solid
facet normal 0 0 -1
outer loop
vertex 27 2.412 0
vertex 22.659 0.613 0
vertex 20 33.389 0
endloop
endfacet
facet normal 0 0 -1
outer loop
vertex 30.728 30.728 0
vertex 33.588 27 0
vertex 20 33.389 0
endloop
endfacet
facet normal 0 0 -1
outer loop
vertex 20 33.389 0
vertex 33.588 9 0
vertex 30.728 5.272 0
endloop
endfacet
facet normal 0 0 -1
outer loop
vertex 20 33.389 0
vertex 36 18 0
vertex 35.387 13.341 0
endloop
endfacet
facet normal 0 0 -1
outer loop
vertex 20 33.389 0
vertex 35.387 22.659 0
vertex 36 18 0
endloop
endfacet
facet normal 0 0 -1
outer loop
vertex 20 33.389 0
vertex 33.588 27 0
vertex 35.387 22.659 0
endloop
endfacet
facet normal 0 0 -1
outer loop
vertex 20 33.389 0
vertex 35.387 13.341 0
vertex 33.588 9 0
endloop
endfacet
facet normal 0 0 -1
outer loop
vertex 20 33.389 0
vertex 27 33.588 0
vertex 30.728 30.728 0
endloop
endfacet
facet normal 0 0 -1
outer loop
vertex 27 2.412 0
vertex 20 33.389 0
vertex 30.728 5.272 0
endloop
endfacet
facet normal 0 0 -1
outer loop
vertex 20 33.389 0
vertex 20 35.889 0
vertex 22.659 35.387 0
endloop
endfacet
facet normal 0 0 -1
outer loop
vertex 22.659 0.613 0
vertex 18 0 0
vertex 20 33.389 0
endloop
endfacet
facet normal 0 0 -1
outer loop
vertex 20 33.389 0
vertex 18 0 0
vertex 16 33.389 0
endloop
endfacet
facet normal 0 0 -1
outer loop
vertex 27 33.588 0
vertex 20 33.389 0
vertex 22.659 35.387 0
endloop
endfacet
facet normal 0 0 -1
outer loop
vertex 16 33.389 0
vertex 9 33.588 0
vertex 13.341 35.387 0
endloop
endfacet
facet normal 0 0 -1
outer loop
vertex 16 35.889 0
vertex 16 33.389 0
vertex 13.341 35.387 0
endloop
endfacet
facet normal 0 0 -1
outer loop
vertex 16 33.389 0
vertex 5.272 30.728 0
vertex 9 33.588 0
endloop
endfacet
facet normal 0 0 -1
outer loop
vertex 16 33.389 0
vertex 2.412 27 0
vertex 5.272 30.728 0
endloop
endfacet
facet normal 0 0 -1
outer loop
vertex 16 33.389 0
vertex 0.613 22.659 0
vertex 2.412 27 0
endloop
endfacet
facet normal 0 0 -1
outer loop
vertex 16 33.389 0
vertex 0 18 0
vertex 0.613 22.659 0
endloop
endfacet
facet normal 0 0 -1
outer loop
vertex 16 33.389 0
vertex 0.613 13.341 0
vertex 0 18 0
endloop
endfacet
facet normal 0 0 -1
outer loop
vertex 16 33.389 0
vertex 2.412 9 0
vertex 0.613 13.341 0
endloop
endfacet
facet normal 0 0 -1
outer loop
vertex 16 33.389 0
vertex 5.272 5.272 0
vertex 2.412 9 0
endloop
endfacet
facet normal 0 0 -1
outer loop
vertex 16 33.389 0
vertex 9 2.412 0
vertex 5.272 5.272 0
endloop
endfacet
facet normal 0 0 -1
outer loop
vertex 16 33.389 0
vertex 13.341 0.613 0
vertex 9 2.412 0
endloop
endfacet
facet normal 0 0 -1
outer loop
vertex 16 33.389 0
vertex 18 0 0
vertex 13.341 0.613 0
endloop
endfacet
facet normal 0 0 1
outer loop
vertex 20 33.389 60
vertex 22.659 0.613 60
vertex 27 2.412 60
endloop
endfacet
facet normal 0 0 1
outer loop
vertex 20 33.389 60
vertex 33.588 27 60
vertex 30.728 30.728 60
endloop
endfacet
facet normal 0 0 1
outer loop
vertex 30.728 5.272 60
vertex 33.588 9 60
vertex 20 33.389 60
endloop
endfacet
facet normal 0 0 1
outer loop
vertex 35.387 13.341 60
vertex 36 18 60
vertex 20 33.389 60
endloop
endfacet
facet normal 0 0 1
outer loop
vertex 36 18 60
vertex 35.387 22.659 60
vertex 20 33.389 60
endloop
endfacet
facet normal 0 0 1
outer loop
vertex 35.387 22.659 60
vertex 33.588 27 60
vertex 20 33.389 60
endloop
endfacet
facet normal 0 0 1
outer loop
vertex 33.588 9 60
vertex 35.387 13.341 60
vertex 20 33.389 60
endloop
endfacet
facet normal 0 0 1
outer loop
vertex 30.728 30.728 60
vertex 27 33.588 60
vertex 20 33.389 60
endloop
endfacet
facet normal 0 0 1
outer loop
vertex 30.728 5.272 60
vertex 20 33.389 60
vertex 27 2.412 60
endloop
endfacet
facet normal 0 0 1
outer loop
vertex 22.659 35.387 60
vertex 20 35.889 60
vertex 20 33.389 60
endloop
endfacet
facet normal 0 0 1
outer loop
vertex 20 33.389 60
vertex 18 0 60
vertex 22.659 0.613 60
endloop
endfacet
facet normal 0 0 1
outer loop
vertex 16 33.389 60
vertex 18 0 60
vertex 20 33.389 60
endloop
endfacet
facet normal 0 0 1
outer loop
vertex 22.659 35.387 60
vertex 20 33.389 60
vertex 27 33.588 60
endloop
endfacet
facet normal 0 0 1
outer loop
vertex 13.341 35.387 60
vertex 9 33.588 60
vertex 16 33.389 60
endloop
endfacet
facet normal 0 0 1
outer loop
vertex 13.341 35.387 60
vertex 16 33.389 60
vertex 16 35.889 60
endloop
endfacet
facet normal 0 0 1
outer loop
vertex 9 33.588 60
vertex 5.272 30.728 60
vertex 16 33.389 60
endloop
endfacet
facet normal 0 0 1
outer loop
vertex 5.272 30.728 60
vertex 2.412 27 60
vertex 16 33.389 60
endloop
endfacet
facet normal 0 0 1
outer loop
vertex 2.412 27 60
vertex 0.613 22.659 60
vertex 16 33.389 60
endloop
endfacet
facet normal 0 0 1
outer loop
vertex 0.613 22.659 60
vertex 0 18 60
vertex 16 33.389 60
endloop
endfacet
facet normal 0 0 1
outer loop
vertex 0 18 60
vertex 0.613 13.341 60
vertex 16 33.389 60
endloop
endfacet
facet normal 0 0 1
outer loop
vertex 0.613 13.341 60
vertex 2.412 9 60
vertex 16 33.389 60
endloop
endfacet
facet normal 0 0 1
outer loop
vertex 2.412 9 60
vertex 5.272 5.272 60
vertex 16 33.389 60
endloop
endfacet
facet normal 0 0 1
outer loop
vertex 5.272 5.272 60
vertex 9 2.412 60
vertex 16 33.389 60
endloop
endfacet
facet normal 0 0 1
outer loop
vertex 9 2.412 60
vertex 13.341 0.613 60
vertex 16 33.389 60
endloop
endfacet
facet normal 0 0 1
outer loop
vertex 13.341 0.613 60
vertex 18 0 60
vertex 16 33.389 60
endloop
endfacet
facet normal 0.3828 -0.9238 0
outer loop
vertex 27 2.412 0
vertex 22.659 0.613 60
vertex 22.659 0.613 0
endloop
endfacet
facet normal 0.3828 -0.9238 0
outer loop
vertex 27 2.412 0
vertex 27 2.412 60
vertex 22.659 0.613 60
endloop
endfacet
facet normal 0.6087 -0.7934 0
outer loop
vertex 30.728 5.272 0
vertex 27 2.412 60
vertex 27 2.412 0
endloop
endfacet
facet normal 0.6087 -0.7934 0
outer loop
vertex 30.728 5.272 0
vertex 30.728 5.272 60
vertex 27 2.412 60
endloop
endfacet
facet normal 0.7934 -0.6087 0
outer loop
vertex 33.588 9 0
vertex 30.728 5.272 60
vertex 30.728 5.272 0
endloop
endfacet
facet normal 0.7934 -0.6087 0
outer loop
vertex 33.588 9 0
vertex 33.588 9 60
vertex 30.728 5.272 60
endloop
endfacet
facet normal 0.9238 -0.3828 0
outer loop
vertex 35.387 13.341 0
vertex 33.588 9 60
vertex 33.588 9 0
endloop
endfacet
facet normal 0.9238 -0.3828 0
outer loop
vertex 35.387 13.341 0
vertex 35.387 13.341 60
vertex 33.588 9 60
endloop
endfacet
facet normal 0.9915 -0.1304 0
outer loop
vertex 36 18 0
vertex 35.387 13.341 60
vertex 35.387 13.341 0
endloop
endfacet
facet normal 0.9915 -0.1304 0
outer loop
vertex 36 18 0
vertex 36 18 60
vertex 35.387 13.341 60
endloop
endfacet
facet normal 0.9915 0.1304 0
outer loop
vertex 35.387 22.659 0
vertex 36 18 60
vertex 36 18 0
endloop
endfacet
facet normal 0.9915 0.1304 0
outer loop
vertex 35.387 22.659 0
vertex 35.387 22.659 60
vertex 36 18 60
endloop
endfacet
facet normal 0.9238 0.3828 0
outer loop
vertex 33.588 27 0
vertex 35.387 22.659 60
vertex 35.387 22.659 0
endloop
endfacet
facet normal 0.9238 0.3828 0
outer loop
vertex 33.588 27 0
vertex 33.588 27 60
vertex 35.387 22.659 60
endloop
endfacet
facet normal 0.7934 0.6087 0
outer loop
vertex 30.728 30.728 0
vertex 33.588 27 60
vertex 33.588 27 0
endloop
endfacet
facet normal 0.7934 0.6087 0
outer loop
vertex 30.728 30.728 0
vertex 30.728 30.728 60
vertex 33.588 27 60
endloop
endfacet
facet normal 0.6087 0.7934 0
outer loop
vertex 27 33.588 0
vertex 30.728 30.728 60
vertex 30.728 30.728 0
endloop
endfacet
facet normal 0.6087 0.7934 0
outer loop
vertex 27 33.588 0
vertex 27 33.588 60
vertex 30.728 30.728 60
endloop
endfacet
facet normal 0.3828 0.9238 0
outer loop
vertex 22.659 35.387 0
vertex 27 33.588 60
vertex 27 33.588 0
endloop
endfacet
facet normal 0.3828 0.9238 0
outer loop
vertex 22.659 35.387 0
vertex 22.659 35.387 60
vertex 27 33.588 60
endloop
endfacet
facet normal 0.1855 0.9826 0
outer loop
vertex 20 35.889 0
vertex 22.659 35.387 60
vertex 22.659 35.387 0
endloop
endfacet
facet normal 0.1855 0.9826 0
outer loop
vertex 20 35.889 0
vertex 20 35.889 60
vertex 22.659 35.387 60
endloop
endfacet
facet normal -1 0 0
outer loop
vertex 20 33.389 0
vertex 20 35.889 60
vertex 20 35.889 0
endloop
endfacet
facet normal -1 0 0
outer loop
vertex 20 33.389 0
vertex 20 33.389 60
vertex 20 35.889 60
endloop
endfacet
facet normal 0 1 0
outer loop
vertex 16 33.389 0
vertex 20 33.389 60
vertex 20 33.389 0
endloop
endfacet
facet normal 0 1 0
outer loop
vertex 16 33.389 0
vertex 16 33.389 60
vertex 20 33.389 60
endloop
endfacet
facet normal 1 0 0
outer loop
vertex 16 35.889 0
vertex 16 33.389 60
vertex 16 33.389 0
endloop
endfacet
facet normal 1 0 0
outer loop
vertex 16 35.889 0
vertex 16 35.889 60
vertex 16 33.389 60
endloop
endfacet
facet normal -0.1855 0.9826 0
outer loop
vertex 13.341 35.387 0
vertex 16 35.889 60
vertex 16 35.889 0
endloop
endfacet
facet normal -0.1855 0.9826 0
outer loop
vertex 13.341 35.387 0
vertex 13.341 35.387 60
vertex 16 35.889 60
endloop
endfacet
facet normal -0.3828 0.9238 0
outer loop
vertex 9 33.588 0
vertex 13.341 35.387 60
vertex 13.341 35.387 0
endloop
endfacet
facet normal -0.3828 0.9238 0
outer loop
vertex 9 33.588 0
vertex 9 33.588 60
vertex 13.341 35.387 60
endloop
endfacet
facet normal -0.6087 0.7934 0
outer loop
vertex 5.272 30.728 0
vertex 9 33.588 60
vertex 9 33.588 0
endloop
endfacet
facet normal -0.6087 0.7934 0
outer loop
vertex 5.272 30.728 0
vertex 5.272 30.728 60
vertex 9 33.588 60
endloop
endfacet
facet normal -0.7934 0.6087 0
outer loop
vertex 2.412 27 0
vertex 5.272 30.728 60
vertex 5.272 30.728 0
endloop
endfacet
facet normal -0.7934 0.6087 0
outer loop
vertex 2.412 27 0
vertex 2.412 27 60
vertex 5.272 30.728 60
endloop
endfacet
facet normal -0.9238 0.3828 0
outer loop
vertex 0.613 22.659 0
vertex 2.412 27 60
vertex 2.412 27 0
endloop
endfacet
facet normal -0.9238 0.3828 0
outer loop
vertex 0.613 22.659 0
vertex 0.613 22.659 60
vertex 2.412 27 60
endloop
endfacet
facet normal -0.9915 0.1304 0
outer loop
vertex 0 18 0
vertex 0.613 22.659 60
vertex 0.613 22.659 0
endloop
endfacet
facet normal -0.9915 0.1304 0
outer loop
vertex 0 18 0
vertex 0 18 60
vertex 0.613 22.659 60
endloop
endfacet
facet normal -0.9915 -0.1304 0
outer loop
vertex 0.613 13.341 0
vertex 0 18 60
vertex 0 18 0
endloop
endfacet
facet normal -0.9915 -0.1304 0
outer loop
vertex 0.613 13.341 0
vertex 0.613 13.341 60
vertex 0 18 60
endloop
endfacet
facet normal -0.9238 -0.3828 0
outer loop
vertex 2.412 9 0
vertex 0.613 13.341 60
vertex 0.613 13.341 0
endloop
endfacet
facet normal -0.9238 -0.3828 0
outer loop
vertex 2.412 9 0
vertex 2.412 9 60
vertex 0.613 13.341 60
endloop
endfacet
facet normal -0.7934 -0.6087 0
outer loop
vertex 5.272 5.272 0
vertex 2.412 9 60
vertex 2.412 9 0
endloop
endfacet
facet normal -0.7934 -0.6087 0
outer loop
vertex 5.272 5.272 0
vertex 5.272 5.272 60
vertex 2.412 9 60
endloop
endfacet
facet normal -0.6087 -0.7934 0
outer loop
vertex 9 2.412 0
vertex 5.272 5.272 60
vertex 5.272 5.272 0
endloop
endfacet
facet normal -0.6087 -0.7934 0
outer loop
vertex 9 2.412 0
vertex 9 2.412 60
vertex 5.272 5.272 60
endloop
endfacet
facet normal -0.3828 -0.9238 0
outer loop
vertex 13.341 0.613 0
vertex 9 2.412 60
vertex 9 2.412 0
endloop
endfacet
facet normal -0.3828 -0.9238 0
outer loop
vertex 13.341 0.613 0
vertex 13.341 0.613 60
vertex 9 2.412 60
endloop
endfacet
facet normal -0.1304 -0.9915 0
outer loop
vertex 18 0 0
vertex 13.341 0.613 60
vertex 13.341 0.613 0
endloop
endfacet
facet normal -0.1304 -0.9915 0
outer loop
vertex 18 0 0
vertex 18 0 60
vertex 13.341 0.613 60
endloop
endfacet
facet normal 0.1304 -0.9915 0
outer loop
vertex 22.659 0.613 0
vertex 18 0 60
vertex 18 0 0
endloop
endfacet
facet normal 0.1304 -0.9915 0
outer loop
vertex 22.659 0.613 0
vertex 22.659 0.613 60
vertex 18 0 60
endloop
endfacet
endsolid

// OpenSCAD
$fn = 32;

// ----------------------------------------------------------------------
// Keyway shaft: d36 shaft, key 4 x 2.5 mm
// ----------------------------------------------------------------------

// --- parameters (mm) ---
shaft_r = 18;             // shaft radius
key_w = 4;                // keyway width
key_d = 2.5;              // keyway depth below the surface line
plate_t = 60;             // shaft length, Z (extrusion height)

shaft_d = 2 * shaft_r;  // shaft diameter
circle_step = 15;  // polygon sampling step, degrees

profile = [[13.341, 35.387], [9, 33.588], [5.272, 30.728], [2.412, 27], [0.613, 22.659], [0, 18], [0.613, 13.341], [2.412, 9], [5.272, 5.272], [9, 2.412], [13.341, 0.613], [18, 0], [22.659, 0.613], [27, 2.412], [30.728, 5.272], [33.588, 9], [35.387, 13.341], [36, 18], [35.387, 22.659], [33.588, 27], [30.728, 30.728], [27, 33.588], [22.659, 35.387], [20, 35.889], [20, 33.389], [16, 33.389], [16, 35.889]];  // primary outline, 27 points, counter clockwise

// --- the one profile operation ---
linear_extrude(height = plate_t) polygon(points = profile);
